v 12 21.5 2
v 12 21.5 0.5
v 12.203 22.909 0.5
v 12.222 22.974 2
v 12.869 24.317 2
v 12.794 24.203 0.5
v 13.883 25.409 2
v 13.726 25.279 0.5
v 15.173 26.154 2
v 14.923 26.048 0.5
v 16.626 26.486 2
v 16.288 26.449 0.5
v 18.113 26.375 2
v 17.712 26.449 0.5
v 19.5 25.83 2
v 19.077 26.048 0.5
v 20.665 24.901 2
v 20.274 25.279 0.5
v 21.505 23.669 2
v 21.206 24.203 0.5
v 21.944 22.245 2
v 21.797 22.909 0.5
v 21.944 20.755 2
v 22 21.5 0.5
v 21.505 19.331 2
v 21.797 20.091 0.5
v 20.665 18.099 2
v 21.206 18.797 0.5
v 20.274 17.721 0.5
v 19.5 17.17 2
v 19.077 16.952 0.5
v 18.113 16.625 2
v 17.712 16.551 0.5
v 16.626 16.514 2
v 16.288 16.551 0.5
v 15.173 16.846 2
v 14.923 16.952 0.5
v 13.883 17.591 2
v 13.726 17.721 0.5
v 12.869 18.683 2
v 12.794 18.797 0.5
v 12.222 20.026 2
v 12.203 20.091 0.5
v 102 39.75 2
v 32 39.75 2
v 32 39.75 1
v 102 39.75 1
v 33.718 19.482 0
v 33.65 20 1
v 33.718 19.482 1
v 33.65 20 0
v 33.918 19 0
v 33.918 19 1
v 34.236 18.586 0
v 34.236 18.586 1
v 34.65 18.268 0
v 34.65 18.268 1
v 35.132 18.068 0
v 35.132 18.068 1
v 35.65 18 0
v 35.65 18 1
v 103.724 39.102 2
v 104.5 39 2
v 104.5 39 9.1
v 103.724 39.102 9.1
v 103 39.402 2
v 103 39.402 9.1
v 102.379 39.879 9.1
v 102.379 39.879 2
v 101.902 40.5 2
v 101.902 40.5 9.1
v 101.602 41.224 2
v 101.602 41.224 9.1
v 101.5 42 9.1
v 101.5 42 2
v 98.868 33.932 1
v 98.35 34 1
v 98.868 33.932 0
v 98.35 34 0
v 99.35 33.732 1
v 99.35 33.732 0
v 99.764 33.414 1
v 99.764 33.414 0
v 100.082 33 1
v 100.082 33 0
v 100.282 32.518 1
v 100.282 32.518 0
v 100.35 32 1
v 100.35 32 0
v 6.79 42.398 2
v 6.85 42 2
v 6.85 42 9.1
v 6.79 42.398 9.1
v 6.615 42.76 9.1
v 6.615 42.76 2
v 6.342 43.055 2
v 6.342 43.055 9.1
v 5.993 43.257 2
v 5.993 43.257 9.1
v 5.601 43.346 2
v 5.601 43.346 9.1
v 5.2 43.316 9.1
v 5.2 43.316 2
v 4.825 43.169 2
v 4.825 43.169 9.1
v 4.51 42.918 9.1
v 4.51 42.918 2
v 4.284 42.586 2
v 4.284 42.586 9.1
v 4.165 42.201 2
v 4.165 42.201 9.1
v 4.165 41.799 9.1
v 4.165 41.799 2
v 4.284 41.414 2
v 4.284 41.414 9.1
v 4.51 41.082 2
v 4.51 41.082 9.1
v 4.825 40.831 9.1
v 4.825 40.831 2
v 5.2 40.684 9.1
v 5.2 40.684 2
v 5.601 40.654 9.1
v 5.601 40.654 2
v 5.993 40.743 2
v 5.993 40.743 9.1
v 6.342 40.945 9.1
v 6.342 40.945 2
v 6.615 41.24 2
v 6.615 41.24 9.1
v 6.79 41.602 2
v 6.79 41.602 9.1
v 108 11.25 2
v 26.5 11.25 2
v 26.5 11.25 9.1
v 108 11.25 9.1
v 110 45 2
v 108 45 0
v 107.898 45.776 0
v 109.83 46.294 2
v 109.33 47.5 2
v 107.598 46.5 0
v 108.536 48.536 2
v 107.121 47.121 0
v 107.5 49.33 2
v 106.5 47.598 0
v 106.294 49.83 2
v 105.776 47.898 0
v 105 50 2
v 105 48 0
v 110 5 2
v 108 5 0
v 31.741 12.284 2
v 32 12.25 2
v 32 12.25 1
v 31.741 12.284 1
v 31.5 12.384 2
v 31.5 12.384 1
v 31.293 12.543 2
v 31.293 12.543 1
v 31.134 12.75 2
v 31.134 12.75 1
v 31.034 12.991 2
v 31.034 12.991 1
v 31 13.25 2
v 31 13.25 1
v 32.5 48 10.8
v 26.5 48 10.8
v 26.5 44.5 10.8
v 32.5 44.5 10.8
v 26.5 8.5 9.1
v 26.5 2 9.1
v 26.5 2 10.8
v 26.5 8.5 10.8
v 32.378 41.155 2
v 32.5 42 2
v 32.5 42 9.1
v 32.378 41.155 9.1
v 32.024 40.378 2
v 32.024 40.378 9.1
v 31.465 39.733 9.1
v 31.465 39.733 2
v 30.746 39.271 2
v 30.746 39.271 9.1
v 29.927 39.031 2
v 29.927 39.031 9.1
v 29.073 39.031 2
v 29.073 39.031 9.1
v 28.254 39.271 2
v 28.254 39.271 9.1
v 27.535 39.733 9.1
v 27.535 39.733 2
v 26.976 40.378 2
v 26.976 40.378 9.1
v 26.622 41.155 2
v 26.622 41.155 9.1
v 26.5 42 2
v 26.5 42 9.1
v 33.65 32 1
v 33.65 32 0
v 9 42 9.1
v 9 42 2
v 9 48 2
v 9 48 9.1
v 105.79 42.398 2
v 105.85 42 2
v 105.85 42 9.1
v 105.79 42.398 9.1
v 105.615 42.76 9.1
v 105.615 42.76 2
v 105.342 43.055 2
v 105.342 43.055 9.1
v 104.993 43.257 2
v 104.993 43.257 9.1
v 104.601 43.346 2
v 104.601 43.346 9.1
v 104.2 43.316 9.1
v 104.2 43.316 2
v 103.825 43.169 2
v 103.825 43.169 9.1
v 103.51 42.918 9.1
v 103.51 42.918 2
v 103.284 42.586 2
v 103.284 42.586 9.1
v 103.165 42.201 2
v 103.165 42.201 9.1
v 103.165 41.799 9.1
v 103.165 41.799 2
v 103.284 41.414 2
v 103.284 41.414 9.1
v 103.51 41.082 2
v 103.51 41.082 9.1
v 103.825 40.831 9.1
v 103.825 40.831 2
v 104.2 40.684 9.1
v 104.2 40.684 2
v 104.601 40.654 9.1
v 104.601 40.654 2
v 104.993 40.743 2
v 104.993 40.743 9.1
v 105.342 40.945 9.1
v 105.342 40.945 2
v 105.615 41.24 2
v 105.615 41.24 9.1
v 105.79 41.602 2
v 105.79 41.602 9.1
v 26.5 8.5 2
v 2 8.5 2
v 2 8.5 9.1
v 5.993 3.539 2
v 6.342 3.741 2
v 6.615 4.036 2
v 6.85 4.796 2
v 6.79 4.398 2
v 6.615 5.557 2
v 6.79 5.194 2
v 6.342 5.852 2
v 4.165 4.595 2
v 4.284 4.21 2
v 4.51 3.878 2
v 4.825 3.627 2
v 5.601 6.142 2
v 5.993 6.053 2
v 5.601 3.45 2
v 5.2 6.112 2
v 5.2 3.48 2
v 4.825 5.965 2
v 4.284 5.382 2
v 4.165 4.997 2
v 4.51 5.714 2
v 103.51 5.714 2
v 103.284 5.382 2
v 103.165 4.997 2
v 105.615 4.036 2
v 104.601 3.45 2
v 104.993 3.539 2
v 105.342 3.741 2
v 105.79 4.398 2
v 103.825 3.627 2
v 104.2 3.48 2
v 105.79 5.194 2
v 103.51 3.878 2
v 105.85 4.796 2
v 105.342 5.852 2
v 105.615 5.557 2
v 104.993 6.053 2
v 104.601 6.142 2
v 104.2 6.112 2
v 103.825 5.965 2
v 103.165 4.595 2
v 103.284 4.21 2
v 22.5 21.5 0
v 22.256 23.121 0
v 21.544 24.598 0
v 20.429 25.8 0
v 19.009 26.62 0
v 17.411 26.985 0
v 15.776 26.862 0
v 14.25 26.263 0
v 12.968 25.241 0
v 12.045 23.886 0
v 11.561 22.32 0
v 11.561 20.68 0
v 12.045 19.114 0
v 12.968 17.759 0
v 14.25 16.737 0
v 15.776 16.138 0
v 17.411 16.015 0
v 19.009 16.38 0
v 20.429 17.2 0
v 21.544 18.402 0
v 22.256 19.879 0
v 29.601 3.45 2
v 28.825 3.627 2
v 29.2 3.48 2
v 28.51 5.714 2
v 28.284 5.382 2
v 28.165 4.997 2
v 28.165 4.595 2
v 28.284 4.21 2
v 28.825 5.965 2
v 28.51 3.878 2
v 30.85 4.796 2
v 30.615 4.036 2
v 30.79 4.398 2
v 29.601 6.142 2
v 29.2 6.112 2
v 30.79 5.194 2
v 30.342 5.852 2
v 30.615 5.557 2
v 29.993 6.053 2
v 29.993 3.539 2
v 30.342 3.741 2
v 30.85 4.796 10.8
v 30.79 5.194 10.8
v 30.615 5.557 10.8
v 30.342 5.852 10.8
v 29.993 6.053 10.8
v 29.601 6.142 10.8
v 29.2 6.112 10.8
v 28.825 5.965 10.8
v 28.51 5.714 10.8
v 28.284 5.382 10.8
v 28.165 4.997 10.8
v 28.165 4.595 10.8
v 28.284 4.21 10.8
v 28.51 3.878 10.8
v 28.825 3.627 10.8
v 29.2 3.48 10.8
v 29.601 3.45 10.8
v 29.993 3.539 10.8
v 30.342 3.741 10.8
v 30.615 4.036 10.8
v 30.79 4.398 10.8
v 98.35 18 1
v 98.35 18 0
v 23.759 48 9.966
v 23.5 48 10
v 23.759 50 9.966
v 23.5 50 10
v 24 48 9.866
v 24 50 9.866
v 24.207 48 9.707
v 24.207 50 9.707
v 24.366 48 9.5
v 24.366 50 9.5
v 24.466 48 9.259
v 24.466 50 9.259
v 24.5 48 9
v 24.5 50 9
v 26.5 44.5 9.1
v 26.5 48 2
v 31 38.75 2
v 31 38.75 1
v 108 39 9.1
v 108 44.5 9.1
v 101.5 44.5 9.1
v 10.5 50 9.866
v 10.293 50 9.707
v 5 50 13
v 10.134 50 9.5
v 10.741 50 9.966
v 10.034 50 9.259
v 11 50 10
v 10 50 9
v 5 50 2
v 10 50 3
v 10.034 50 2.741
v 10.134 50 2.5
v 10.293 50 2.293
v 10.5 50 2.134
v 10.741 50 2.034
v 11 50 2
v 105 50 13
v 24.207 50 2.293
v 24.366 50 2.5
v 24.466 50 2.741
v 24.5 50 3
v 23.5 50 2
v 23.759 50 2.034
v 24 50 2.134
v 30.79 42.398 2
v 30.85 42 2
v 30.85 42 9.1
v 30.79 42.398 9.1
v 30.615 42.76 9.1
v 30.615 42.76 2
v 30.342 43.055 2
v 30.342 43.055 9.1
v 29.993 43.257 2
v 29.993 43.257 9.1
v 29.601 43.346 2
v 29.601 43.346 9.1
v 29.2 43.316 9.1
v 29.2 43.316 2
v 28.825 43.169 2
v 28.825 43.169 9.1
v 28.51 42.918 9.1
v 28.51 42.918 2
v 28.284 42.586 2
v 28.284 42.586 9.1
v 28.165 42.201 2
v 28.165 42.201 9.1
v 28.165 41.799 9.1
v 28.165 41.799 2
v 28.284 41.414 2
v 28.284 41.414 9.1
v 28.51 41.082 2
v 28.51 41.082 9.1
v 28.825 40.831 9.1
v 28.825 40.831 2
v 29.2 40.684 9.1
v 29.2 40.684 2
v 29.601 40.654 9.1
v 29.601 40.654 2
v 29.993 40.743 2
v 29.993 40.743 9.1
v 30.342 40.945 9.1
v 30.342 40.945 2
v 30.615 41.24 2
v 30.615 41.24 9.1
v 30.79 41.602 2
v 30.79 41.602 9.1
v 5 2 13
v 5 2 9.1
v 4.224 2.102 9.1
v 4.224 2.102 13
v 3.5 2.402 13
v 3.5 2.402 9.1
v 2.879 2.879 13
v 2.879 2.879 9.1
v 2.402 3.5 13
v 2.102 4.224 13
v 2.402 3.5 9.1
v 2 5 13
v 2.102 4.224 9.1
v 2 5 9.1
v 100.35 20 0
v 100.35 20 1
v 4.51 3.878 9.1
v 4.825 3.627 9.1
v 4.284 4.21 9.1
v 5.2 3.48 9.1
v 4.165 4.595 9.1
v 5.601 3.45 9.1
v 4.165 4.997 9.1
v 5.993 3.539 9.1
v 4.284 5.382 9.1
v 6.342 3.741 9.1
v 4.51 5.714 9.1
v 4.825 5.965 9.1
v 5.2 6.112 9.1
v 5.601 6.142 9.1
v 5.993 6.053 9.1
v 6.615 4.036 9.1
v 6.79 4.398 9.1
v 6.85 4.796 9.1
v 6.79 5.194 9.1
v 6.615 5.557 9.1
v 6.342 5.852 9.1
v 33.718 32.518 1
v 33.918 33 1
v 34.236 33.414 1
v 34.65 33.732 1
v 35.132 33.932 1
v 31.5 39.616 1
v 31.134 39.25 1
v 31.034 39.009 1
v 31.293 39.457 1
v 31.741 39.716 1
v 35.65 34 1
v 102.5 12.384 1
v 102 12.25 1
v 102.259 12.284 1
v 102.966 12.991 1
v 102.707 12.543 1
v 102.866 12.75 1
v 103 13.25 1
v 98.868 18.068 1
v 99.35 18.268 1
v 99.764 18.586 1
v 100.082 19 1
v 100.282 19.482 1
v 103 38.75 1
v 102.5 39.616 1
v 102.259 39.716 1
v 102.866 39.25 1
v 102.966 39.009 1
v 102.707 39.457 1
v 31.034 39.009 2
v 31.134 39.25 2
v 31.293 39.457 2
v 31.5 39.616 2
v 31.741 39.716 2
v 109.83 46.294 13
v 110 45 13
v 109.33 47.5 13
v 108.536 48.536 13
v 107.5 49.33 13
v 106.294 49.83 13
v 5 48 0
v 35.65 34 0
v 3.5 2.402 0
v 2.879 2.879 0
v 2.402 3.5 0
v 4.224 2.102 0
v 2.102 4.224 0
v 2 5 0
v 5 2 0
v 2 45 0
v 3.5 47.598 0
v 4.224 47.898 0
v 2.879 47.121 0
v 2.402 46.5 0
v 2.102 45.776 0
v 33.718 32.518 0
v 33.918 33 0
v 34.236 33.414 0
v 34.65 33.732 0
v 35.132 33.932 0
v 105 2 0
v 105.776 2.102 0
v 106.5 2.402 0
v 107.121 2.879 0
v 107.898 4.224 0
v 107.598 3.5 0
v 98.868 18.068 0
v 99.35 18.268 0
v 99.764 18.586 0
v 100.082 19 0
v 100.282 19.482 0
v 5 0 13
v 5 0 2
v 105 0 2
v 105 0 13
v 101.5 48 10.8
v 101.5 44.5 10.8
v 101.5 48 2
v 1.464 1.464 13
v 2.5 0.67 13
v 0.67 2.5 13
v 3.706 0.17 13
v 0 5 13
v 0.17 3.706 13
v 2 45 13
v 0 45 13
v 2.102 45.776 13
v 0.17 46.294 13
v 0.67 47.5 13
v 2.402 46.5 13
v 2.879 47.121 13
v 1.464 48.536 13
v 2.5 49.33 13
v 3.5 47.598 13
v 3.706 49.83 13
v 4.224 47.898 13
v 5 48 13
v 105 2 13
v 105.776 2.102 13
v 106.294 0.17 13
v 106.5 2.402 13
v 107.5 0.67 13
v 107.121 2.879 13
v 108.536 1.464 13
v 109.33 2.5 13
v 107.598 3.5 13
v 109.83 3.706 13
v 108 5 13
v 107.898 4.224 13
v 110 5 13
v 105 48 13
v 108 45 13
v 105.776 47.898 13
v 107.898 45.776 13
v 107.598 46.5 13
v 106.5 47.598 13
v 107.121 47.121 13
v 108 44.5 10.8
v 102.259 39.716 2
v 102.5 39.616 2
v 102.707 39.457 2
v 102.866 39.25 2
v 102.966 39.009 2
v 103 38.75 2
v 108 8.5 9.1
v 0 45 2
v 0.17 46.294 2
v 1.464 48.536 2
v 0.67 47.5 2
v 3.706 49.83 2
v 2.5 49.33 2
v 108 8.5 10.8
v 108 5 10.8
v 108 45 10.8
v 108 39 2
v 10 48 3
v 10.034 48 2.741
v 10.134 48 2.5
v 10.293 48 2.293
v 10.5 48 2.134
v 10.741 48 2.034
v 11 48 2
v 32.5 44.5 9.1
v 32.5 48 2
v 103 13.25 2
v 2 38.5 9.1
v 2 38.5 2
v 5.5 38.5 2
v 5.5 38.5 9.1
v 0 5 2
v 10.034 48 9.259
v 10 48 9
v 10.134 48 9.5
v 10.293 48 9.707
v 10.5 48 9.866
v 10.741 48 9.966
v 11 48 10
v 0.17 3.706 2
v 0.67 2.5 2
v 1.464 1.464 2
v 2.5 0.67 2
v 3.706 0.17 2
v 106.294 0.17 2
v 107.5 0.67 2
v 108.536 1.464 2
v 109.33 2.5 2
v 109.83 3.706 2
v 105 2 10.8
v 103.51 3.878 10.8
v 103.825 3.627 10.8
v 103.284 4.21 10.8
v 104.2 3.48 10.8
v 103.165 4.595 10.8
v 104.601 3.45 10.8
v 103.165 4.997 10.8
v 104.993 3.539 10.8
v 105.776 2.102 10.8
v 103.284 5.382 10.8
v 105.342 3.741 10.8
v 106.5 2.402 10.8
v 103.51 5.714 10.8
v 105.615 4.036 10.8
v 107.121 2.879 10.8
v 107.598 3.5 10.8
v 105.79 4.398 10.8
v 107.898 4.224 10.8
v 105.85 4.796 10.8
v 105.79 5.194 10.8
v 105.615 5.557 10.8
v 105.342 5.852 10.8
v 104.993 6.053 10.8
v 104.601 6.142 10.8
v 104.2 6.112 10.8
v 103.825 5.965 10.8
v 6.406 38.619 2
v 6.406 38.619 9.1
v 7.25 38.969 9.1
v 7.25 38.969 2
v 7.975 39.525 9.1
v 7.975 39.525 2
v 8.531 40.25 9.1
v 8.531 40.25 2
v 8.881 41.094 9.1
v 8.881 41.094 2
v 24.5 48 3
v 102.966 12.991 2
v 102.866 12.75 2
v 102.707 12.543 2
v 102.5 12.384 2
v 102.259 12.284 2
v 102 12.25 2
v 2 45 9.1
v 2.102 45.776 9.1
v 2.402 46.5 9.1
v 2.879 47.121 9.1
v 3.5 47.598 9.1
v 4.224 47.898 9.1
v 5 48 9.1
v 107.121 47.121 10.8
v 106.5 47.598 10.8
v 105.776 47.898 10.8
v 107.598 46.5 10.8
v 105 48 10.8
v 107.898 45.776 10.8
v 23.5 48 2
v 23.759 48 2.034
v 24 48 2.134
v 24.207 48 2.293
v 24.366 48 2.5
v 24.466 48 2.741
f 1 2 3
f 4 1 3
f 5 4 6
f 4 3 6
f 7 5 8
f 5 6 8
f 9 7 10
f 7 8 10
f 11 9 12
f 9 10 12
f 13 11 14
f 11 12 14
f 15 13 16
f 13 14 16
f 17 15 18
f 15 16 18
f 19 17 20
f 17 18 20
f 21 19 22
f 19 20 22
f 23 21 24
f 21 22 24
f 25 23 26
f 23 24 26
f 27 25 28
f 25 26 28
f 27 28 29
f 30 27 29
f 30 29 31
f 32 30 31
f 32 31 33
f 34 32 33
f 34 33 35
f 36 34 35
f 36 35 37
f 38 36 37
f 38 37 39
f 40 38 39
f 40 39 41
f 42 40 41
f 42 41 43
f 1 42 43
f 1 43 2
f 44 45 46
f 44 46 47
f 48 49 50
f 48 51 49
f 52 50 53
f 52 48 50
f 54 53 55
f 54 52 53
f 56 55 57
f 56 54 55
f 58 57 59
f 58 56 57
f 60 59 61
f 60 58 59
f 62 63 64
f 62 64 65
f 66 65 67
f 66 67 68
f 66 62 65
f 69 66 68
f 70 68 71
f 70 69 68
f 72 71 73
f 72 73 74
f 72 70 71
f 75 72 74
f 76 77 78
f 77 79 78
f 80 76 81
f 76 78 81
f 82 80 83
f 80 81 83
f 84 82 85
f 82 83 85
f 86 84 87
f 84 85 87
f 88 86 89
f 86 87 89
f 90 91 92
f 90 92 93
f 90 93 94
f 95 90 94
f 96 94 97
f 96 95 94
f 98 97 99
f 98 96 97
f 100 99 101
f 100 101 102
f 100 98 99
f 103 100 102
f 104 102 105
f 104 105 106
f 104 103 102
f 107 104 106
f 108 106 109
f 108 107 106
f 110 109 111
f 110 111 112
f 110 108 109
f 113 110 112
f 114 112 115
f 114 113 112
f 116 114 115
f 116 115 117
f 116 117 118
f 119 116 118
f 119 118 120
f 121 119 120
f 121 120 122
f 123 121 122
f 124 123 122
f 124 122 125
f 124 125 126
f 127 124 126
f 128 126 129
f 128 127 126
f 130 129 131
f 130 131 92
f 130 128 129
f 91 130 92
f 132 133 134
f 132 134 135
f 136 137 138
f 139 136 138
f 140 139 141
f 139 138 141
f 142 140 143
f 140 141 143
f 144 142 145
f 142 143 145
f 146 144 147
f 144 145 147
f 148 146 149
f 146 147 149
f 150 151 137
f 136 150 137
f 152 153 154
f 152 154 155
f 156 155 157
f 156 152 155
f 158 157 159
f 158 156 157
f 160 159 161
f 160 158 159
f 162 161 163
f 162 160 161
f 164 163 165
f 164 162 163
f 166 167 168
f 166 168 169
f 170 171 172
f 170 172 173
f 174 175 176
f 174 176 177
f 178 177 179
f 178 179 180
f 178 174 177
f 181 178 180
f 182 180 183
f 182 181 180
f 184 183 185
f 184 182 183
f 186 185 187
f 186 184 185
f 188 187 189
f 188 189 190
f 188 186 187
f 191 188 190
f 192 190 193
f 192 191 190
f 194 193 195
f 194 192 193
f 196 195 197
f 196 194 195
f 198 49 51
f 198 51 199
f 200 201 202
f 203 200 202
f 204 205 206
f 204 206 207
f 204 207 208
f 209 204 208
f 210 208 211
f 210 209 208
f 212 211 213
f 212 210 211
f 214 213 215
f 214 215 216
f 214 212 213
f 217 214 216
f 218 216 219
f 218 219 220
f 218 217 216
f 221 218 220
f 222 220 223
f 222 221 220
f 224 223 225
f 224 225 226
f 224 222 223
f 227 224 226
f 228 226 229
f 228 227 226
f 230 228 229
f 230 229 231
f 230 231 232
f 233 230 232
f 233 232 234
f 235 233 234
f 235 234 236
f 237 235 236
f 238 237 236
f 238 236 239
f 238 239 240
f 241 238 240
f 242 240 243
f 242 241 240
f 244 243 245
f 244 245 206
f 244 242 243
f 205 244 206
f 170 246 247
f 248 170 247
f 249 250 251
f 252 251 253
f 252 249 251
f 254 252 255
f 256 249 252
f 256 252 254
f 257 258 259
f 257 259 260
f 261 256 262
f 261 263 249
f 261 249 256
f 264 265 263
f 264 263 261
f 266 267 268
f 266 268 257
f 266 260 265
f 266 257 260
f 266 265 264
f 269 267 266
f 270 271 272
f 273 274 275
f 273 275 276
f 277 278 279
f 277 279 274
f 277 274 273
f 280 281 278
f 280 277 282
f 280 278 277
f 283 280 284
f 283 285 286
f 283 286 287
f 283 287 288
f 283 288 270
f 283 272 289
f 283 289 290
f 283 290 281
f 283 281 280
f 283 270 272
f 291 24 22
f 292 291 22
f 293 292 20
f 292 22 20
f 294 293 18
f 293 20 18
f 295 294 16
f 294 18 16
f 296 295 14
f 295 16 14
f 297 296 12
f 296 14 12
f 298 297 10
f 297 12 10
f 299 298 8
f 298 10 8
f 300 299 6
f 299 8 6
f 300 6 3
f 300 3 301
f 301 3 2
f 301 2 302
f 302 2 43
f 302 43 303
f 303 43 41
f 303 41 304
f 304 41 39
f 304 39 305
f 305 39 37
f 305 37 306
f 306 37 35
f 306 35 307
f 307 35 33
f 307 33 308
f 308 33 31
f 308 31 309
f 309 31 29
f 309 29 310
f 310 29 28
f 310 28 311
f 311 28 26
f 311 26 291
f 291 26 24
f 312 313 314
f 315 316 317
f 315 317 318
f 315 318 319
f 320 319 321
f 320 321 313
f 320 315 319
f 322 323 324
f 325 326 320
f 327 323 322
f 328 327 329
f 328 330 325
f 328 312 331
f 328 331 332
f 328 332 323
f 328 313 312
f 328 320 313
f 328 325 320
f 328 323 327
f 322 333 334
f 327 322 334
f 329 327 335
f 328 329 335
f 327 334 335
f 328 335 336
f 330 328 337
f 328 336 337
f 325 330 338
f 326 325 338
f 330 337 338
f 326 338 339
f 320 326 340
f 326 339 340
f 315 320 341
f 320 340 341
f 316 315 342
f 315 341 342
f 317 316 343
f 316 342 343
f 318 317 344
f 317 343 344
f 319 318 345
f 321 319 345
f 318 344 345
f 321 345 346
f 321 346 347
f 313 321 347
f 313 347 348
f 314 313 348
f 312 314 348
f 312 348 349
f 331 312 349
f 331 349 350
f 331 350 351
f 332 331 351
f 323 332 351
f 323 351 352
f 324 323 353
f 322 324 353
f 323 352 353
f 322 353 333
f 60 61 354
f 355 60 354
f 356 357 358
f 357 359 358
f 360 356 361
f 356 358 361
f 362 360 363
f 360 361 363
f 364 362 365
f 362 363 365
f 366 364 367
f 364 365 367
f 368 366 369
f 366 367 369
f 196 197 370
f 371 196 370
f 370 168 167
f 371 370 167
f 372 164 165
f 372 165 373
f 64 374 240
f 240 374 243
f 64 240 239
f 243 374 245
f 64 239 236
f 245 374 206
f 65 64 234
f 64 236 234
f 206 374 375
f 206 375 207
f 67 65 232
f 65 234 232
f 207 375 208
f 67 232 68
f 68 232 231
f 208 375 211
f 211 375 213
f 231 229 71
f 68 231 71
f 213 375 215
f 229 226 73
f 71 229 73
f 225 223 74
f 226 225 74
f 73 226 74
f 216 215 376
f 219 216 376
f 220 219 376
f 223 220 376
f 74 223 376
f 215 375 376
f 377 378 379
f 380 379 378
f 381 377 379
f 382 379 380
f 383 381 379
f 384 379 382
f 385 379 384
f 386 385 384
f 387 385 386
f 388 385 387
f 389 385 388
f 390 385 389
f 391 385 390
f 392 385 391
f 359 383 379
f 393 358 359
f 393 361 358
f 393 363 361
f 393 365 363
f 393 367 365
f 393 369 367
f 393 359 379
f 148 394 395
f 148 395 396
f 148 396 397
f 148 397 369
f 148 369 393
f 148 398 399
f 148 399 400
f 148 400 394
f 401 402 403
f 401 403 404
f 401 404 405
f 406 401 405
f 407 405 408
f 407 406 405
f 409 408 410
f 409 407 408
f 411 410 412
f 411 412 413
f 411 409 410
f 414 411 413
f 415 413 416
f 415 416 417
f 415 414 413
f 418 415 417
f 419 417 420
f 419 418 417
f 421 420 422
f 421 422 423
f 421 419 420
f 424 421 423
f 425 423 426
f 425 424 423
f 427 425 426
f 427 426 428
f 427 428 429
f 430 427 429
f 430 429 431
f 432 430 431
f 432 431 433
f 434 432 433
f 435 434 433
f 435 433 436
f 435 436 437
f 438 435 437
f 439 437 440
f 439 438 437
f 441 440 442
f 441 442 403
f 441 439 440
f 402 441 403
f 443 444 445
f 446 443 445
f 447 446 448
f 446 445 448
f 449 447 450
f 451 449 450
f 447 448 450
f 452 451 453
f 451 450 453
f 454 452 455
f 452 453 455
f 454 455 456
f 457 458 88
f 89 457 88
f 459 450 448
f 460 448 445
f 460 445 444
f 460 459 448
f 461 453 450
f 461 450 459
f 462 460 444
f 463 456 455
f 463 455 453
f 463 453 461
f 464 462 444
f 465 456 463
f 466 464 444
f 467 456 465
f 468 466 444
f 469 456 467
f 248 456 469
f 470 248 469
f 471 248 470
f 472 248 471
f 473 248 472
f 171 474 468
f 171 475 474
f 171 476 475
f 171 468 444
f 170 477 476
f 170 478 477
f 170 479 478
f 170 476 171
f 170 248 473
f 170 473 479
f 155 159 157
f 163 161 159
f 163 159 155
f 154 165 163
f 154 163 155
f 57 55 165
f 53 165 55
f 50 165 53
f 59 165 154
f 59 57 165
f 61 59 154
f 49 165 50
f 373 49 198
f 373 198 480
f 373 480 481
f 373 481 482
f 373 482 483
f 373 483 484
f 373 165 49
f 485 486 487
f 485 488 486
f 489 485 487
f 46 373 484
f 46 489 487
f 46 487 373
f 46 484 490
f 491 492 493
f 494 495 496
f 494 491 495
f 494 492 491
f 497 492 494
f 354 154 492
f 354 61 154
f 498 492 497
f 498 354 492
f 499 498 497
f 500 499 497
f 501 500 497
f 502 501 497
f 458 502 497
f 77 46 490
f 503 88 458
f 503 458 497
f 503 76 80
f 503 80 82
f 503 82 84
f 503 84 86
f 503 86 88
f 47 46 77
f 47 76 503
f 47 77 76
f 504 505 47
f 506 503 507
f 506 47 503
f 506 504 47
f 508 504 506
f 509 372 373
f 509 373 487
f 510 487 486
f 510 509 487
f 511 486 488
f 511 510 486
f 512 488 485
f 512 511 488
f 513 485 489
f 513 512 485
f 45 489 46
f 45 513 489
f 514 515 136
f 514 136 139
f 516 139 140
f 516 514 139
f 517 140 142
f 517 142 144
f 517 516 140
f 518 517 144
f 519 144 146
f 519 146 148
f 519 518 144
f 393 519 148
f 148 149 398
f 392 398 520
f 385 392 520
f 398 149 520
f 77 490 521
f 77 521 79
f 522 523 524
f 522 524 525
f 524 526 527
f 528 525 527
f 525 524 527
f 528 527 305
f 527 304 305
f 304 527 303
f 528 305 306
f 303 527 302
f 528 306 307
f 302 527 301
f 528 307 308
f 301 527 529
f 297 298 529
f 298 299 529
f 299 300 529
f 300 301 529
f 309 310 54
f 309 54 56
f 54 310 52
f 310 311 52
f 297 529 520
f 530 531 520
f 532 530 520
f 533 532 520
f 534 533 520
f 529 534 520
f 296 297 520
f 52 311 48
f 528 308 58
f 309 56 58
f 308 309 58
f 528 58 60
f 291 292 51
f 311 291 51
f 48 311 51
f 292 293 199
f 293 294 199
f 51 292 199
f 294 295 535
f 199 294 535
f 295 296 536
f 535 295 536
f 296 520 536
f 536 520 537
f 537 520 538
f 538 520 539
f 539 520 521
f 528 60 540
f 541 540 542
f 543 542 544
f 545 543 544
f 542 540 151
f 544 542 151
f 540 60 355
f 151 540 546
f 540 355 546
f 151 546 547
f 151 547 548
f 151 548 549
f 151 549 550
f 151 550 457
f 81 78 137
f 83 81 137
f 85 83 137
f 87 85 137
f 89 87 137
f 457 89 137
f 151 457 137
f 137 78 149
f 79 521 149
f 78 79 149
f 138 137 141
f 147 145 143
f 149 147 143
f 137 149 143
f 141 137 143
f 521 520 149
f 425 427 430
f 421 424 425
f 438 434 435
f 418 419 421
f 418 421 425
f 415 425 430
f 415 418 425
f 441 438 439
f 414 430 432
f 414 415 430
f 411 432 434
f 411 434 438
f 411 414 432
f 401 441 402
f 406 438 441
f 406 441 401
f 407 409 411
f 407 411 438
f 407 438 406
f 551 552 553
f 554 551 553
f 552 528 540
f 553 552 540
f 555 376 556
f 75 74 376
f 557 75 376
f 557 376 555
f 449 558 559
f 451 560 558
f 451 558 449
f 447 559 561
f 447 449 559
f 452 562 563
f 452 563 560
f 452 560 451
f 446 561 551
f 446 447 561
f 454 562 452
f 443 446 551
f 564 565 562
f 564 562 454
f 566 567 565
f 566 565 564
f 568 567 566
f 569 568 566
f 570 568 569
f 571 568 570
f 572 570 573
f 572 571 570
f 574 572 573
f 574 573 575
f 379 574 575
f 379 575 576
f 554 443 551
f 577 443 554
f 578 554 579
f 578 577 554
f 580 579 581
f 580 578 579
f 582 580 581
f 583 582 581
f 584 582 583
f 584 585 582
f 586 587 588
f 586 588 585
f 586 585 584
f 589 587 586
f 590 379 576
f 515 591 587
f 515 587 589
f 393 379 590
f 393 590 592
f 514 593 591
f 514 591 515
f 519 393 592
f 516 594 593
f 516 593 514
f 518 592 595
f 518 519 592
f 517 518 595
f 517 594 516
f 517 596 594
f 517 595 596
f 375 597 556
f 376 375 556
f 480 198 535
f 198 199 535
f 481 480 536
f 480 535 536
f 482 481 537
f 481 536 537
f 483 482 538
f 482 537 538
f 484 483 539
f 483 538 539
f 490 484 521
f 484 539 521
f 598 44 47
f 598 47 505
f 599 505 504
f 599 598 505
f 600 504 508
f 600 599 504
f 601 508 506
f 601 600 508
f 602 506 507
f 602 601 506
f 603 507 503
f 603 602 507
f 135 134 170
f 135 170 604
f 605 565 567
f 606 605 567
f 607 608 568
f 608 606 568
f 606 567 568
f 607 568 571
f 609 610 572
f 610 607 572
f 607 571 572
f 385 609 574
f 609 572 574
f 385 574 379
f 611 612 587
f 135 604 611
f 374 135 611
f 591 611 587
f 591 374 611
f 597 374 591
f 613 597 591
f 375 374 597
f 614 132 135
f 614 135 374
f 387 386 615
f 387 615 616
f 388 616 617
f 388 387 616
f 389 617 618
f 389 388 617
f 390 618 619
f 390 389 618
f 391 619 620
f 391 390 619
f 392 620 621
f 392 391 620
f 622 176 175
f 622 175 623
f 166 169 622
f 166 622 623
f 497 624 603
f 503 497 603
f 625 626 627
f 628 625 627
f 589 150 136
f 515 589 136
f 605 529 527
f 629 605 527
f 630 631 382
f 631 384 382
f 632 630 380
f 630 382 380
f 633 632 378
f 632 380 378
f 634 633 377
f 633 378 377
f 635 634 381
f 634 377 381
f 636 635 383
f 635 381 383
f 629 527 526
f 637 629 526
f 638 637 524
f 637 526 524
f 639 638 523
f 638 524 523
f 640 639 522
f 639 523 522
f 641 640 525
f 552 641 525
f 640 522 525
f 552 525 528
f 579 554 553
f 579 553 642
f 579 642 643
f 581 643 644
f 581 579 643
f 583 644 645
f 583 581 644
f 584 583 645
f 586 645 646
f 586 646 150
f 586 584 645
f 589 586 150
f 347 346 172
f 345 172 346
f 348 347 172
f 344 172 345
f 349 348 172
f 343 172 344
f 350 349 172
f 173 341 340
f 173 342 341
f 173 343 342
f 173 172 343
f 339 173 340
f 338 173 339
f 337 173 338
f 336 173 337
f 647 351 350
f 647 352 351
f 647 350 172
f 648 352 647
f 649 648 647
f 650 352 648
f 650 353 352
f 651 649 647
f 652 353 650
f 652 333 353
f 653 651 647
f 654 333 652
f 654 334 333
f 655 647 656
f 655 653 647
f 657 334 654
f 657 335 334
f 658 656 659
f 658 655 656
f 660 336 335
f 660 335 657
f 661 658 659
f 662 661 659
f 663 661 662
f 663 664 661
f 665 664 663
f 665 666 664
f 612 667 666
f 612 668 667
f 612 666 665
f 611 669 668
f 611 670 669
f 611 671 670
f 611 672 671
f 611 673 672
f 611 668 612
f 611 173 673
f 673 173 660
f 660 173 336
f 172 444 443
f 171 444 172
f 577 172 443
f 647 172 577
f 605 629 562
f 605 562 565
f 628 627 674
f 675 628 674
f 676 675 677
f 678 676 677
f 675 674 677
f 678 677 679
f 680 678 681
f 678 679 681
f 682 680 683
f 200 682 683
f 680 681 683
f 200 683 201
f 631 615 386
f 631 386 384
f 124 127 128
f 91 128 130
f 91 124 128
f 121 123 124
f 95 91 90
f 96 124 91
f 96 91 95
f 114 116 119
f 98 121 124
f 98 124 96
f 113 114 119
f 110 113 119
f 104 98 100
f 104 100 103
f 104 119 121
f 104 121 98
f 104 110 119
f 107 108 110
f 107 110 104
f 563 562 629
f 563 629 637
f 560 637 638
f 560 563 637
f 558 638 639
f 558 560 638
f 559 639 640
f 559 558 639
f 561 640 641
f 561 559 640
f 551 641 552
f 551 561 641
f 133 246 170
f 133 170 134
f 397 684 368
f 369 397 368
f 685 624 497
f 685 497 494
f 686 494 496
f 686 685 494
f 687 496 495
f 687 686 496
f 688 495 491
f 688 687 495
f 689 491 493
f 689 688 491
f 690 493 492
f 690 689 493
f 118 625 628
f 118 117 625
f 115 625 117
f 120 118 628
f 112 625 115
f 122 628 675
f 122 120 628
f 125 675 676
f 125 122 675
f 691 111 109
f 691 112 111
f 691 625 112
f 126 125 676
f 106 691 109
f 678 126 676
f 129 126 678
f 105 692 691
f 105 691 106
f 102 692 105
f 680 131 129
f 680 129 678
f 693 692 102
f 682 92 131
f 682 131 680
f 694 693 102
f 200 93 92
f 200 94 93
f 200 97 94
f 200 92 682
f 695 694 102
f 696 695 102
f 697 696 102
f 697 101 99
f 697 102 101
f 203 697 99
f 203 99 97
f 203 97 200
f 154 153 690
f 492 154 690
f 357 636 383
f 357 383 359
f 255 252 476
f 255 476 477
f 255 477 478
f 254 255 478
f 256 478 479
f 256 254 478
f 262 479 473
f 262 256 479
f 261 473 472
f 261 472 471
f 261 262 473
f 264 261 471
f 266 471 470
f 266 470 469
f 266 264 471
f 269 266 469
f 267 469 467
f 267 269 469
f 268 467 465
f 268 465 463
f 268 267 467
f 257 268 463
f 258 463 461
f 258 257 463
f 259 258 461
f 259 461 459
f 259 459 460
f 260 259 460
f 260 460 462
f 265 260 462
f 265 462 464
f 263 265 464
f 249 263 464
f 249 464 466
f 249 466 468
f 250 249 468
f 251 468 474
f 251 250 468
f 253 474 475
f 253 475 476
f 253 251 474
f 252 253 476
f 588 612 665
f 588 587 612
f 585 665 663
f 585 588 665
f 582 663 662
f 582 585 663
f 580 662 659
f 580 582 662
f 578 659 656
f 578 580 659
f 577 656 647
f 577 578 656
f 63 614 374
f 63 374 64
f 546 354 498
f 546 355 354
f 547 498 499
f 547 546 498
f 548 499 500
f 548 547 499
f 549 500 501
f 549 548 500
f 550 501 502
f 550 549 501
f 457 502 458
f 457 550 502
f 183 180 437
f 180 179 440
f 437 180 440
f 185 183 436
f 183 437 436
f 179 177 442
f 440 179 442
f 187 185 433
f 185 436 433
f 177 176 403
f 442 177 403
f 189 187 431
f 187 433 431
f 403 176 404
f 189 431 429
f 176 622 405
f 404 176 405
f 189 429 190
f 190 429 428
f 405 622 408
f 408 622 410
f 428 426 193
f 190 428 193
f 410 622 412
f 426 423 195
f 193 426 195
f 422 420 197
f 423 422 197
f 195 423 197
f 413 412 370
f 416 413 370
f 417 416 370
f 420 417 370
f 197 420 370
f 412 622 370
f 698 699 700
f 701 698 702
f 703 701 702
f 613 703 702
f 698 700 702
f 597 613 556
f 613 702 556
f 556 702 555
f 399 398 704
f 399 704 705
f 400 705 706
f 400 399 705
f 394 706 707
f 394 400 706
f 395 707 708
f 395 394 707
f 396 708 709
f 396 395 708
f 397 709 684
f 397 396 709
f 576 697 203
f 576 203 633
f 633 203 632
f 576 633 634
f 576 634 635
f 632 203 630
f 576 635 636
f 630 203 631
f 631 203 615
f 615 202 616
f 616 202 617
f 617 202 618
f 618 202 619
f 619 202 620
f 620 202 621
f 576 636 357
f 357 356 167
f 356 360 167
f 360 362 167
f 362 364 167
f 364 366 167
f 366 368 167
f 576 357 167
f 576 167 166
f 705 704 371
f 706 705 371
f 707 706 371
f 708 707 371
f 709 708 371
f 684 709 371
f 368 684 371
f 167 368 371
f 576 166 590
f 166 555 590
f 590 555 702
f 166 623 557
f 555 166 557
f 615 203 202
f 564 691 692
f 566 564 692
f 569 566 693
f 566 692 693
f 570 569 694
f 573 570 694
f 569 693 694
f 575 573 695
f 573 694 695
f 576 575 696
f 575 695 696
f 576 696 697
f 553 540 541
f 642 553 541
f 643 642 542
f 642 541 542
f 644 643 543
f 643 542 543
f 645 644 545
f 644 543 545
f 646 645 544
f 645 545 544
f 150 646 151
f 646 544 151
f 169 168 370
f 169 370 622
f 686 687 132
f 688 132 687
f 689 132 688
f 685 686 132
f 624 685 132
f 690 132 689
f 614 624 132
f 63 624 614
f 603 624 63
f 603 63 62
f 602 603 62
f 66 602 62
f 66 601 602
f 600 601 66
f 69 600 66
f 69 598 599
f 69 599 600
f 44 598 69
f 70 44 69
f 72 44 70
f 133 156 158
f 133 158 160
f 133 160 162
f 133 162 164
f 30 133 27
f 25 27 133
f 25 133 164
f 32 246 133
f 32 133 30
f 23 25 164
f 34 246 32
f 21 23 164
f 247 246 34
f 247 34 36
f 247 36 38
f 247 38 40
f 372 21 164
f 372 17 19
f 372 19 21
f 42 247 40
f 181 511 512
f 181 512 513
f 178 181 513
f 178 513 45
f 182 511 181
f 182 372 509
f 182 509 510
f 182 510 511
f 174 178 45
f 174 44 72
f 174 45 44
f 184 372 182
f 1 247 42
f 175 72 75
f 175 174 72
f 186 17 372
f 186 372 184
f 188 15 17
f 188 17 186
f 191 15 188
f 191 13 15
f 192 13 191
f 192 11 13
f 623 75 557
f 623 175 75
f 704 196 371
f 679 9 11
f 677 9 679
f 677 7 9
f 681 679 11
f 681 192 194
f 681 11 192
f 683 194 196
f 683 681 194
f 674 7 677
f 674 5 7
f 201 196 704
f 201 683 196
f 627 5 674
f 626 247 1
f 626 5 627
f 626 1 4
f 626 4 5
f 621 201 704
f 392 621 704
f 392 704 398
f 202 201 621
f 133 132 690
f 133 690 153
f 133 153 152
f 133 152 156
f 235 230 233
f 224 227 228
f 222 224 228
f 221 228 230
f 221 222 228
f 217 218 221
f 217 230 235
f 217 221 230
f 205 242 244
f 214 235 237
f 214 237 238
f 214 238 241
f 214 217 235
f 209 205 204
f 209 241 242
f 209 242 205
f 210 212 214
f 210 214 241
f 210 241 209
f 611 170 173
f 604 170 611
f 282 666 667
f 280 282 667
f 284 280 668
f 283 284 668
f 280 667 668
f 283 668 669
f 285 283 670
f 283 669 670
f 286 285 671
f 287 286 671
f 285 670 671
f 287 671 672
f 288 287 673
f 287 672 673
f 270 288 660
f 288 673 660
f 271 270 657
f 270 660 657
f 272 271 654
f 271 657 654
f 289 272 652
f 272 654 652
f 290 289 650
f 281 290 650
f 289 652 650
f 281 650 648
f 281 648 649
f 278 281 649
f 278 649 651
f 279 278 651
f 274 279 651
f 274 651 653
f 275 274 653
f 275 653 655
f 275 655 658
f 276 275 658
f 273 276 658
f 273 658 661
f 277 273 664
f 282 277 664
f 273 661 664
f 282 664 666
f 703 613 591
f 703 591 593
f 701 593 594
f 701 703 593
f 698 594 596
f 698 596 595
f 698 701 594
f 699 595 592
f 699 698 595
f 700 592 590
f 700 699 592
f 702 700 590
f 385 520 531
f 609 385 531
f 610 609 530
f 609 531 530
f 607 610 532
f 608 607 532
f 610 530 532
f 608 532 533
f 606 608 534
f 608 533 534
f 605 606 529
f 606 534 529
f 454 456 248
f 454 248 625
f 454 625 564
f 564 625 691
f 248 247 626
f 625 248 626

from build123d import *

# Parameters (mm, degrees)
SKICA1_W                    = 110
SKICA1_H                    = 50
P_IDAT_VYSUNUT_M1_DEPTH     = 13
SKO_EPINA1_T                = -2
SKICA3_W                    = 66.7
SKICA3_H                    = 16
ODEBRAT_VYSUNUT_M1_DEPTH    = 2
SKICA6_R                    = 1.35
SKICA6_W                    = 81.5
SKICA6_H                    = 9.25
P_IDAT_VYSUNUT_M3_DEPTH     = 7.1
SKICA8_W                    = 72
SKICA8_H                    = 27.5
ODEBRAT_VYSUNUT_M2_DEPTH    = 1
ZAOBLIT3_R                  = 1
ZAOBLIT4_R                  = 2
SKICA9_W                    = 81.5
SKICA9_H                    = 6.5
P_IDAT_VYSUNUT_M4_DEPTH     = 1.7
SKICA10_R                   = 1.35
ODEBRAT_VYSUNUT_M3_DEPTH    = 8.8
ZAOBLIT5_R                  = 5
ZAOBLIT6_R                  = 3
SKICA11_R                   = 5
ODEBRAT_VYSUNUT_M4_DEPTH    = 2
ZKOSEN_1_SIZE               = 2
P_IDAT_VYSUNUT_M5_OUTLINE_R = 1.35
P_IDAT_VYSUNUT_M5_DEPTH     = 7.1
SKICA13_W                   = 14.5
SKICA13_H                   = 8
ODEBRAT_VYSUNUT_M5_DEPTH    = 2
ZAOBLIT7_R                  = 1
ZAOBLIT8_R                  = 1
P_IDAT_START                = 1.7
SKICA14_W                   = 6
SKICA14_H                   = 3.5
P_IDAT_VYSUNUT_M6_DEPTH     = 1.7


# Read off the part's stored shape, not the designer's step: Přidat vysunutím5
with BuildPart() as part:
    # Skica1 → Přidat vysunutím1 (new body)
    with BuildSketch(Plane.XY):
        with Locations((55, 25)):
            Rectangle(SKICA1_W, SKICA1_H)
    extrude(amount=P_IDAT_VYSUNUT_M1_DEPTH)

    # Skořepina1
    sko_epina1_openings = [part.faces().sort_by_distance(p)[0] for p in [
        (55, 25, 13),
    ]]
    offset(amount=SKO_EPINA1_T, openings=sko_epina1_openings, kind=Kind.INTERSECTION)

    # Skica3 → Odebrat vysunutím1 (cut)
    with BuildSketch(Plane.XY.offset(2)):
        with Locations((67, 26)):
            Rectangle(SKICA3_W, SKICA3_H)
    extrude(amount=-ODEBRAT_VYSUNUT_M1_DEPTH, mode=Mode.SUBTRACT)

    # Skica6 → Přidat vysunutím3 (add)
    # profile 1 of 3: a face of its own
    with BuildSketch(Plane.XY.offset(2)):
        with BuildLine():
            Line((26.5, 42), (26.5, 48))
            Line((26.5, 48), (32.5, 48))
            Line((32.5, 48), (32.5, 42))
            ThreePointArc((32.5, 42), (29.5, 39), (26.5, 42))
        make_face()
        with Locations((29.5, 42)):
            Circle(SKICA6_R, mode=Mode.SUBTRACT)
    # profile 2 of 3: a face of its own
    with BuildSketch(Plane.XY.offset(2)):
        with BuildLine():
            Line((101.5, 42), (101.5, 48))
            Line((101.5, 48), (108, 48))
            Line((108, 48), (108, 39))
            Line((108, 39), (104.5, 39))
            ThreePointArc((104.5, 39), (102.378679656, 39.878679656), (101.5, 42))
        make_face()
        with Locations((104.5, 42)):
            Circle(SKICA6_R, mode=Mode.SUBTRACT)
    # profile 3 of 3: a face of its own
    with BuildSketch(Plane.XY.offset(2)):
        with Locations((67.25, 6.625)):
            Rectangle(SKICA6_W, SKICA6_H)
    extrude(amount=P_IDAT_VYSUNUT_M3_DEPTH)

    # Skica8 → Odebrat vysunutím2 (cut)
    with BuildSketch(Plane.XY.offset(2)):
        with Locations((67, 26)):
            Rectangle(SKICA8_W, SKICA8_H)
    extrude(amount=-ODEBRAT_VYSUNUT_M2_DEPTH, mode=Mode.SUBTRACT)

    # Zaoblit3
    # the kernel refuses this fillet: 1 mm, written as the material it adds along each edge
    with BuildSketch(Plane(origin=(31, 12.25, 2), x_dir=(1, 0, 0), z_dir=(0, 0, -1)), Plane(origin=(31, 39.75, 2), x_dir=(0, -1, 0), z_dir=(0, 0, -1))) as zaoblit3_piece_1:
        with BuildLine():
            CenterArc((ZAOBLIT3_R, -ZAOBLIT3_R), ZAOBLIT3_R, 90, 90)
            Line((0, -ZAOBLIT3_R), (0, 0))
            Line((0, 0), (ZAOBLIT3_R, 0))
        make_face()
    extrude(amount=1)
    with BuildSketch(Plane(origin=(103, 39.75, 2), x_dir=(0, -1, 0), z_dir=(0, 0, -1)), Plane(origin=(103, 12.25, 2), x_dir=(-1, 0, 0), z_dir=(0, 0, -1))) as zaoblit3_piece_2:
        with BuildLine():
            CenterArc((ZAOBLIT3_R, ZAOBLIT3_R), ZAOBLIT3_R, 180, 90)
            Line((0, ZAOBLIT3_R), (0, 0))
            Line((0, 0), (ZAOBLIT3_R, 0))
        make_face()
    extrude(amount=1)

    # Zaoblit4
    zaoblit4_edges = [part.edges().sort_by_distance(p)[0] for p in [
        (100.35, 18, 0.5),
        (100.35, 34, 0.5),
        (33.65, 34, 0.5),
        (33.65, 18, 0.5),
    ]]
    fillet(zaoblit4_edges, radius=ZAOBLIT4_R)

    # Skica9 → Přidat vysunutím4 (add)
    with BuildSketch(Plane.XY.offset(9.1)):
        with Locations((67.25, 5.25)):
            Rectangle(SKICA9_W, SKICA9_H)
    extrude(amount=P_IDAT_VYSUNUT_M4_DEPTH)

    # Skica10 → Odebrat vysunutím3 (cut)
    with BuildSketch(Plane.XY.offset(10.8)):
        with Locations((104.5, 4.796123071)):
            Circle(SKICA10_R)
        with Locations((29.5, 4.796123071)):
            Circle(SKICA10_R)
    extrude(amount=-ODEBRAT_VYSUNUT_M3_DEPTH, mode=Mode.SUBTRACT)

    # Zaoblit5
    zaoblit5_edges = [part.edges().sort_by_distance(p)[0] for p in [
        (0, 50, 6.5),
        (110, 50, 6.5),
        (110, 0, 6.5),
        (0, 0, 6.5),
    ]]
    fillet(zaoblit5_edges, radius=ZAOBLIT5_R)

    # Zaoblit6
    zaoblit6_edges = [part.edges().sort_by_distance(p)[0] for p in [
        (2, 48, 7.5),
        (2, 2, 7.5),
        (108, 2, 11.9),
        (108, 48, 11.05),
    ]]
    fillet(zaoblit6_edges, radius=ZAOBLIT6_R)

    # Skica11 → Odebrat vysunutím4 (cut)
    with BuildSketch(Plane(origin=(0, 0, 0), x_dir=(-1, 0, 0), z_dir=(0, 0, -1))):
        with Locations((-17, 21.5)):
            Circle(SKICA11_R)
    extrude(amount=-ODEBRAT_VYSUNUT_M4_DEPTH, mode=Mode.SUBTRACT)

    # Zkosení1
    zkosen_1_edges = [part.edges().sort_by_distance(p)[0] for p in [
        (55, 0, 0),
        (0, 25, 0),
        (55, 50, 0),
        (110, 25, 0),
        (1.464466094, 48.535533906, 0),
        (108.535533906, 48.535533906, 0),
        (108.535533906, 1.464466094, 0),
        (1.464466094, 1.464466094, 0),
    ]]
    chamfer(zkosen_1_edges, length=ZKOSEN_1_SIZE)

    # Přidat vysunutím5 outline → Přidat vysunutím5 (add)
    # profile 1 of 2: a face of its own
    with BuildSketch(Plane.XY.offset(2)):
        with BuildLine():
            Line((2, 45), (2, 38.5))
            Line((2, 38.5), (5.5, 38.5))
            ThreePointArc((5.5, 38.5), (7.974873734, 39.525126266), (9, 42))
            Line((9, 42), (9, 48))
            Line((9, 48), (5, 48))
            ThreePointArc((5, 48), (2.878679656, 47.121320344), (2, 45))
        make_face()
        with Locations((5.5, 42)):
            Circle(P_IDAT_VYSUNUT_M5_OUTLINE_R, mode=Mode.SUBTRACT)
    # profile 2 of 2: a face of its own
    with BuildSketch(Plane.XY.offset(2)):
        with BuildLine():
            Line((26.5, 8.5), (2, 8.5))
            Line((2, 8.5), (2, 5))
            ThreePointArc((2, 5), (2.878679656, 2.878679656), (5, 2))
            Line((5, 2), (26.5, 2))
            Line((26.5, 2), (26.5, 8.5))
        make_face()
        with Locations((5.5, 4.796123071)):
            Circle(P_IDAT_VYSUNUT_M5_OUTLINE_R, mode=Mode.SUBTRACT)
    extrude(amount=P_IDAT_VYSUNUT_M5_DEPTH)

    # P_idat vysunut_m5 2 outline → P_idat vysunut_m5 2 (revolve, cut)
    with BuildSketch(Plane(origin=(17, 21.5, 0), x_dir=(1, 0, 0), z_dir=(0, -1, 0))):
        Polygon((5.5, 0), (5, 0.5), (5, 0), align=None)
    revolve(axis=Axis((17, 21.5, 0), (0, 0, 1)), mode=Mode.SUBTRACT)

    # Skica13 → Odebrat vysunutím5 (cut)
    with BuildSketch(Plane.XZ.offset(-48)):
        with Locations((17.25, 6)):
            Rectangle(SKICA13_W, SKICA13_H)
    extrude(amount=-ODEBRAT_VYSUNUT_M5_DEPTH, mode=Mode.SUBTRACT)

    # Zaoblit7
    zaoblit7_edges = [part.edges().sort_by_distance(p)[0] for p in [
        (10, 49, 10),
        (24.5, 49, 10),
    ]]
    fillet(zaoblit7_edges, radius=ZAOBLIT7_R)

    # Zaoblit8
    zaoblit8_edges = [part.edges().sort_by_distance(p)[0] for p in [
        (10, 49, 2),
        (24.5, 49, 2),
    ]]
    fillet(zaoblit8_edges, radius=ZAOBLIT8_R)

    # Skica14 → Přidat vysunutím6 (add)
    with BuildSketch(Plane.XY.offset(9.1).offset(P_IDAT_START)):
        with Locations((29.5, 46.25)):
            Rectangle(SKICA14_W, SKICA14_H)
        with BuildLine():
            Line((101.5, 48), (105, 48))
            ThreePointArc((105, 48), (107.121320344, 47.121320344), (108, 45))
            Line((108, 45), (108, 44.5))
            Line((108, 44.5), (101.5, 44.5))
            Line((101.5, 44.5), (101.5, 48))
        make_face()
    extrude(amount=-P_IDAT_VYSUNUT_M6_DEPTH)


solid = part.part
